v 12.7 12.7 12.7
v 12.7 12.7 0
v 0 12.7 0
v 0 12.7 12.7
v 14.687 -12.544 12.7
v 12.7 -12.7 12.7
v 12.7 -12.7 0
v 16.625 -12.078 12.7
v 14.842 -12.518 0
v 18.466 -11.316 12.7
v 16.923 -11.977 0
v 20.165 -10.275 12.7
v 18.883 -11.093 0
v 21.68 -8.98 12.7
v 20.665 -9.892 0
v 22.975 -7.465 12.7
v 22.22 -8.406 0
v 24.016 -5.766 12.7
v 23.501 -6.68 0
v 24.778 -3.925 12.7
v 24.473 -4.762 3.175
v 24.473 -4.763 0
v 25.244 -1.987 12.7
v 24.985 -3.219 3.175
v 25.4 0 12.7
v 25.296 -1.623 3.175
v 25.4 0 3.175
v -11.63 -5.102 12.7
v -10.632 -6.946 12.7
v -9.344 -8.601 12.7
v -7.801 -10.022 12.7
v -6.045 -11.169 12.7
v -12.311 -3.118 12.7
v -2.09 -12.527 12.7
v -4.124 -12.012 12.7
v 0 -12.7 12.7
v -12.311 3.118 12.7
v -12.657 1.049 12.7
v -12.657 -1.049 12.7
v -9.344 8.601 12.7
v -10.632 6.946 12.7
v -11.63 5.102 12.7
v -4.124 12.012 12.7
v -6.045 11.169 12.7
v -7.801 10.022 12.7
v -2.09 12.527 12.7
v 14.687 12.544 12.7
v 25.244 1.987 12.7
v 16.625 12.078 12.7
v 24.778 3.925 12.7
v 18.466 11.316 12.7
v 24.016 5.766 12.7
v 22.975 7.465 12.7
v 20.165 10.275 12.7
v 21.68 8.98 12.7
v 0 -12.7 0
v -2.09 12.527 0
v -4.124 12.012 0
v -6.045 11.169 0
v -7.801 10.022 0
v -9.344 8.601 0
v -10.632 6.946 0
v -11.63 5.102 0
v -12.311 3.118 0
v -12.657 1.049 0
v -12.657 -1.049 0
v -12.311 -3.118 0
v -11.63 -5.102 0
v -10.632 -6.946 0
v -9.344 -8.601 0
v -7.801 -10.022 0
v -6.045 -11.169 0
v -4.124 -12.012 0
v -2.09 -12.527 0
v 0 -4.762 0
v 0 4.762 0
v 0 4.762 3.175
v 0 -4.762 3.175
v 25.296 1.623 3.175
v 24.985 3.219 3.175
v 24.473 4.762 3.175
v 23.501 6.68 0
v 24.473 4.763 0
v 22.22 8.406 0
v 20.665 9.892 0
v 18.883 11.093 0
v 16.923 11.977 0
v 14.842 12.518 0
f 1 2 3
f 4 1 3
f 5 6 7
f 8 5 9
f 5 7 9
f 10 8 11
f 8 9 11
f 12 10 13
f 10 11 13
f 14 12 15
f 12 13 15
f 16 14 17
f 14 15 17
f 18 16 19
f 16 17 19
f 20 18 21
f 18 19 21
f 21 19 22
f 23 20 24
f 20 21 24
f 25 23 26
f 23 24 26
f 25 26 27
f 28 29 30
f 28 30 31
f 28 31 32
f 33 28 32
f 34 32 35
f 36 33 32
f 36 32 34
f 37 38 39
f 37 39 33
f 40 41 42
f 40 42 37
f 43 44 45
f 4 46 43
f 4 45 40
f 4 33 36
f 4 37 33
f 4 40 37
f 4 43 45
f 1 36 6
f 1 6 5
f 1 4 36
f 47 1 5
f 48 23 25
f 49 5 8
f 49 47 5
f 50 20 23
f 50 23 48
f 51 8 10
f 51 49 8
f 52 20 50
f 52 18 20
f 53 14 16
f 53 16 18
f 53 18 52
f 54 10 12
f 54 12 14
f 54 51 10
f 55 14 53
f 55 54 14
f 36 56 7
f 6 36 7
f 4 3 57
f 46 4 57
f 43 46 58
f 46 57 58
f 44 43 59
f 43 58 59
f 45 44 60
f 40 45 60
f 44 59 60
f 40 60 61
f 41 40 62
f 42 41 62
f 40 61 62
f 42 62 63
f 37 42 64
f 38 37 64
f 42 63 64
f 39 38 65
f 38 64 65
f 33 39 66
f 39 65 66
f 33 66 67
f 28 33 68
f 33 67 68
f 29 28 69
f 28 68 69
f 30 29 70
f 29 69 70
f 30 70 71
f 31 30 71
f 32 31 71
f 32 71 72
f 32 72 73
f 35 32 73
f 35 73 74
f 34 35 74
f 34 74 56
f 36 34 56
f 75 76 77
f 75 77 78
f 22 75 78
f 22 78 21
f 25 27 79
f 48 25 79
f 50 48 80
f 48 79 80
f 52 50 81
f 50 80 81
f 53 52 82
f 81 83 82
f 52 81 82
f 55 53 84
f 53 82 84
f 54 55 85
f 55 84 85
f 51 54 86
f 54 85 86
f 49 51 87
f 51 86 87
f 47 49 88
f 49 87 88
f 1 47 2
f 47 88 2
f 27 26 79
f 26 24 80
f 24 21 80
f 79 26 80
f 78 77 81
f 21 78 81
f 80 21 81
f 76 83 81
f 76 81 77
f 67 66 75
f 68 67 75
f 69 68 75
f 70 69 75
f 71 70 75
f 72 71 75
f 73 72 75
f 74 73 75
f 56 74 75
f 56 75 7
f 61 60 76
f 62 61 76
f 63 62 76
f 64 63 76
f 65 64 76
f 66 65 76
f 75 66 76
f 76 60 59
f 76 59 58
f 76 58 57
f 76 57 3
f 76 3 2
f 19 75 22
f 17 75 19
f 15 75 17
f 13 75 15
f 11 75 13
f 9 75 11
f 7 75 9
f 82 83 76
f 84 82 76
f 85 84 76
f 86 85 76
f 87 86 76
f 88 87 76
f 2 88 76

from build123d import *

# Parameters (mm, degrees)
F1_DEPTH = 12.7
F3_DEPTH = 3.175


with BuildPart() as f1:
    # F0 (on Top) → F1 (new body)
    with BuildSketch(Plane.XY):
        with BuildLine():
            Line((0, 0), (0, 12.7))
            ThreePointArc((0, 12.7), (-12.7, 0), (0, -12.7))
            Line((0, -12.7), (0, 0))
        make_face()
        with BuildLine():
            Line((12.7, 0), (0, 0))
            ThreePointArc((0, 0), (1.701477, -6.35), (6.35, -10.998523))
            ThreePointArc((6.35, -10.998523), (10.998523, -6.35), (12.7, 0))
        make_face()
        with BuildLine():
            Line((0, 0), (0, -12.7))
            ThreePointArc((0, -12.7), (3.287002, -12.267258), (6.35, -10.998523))
            ThreePointArc((6.35, -10.998523), (1.701477, -6.35), (0, 0))
        make_face()
        with BuildLine():
            ThreePointArc((6.35, 10.998523), (3.287002, 12.267258), (0, 12.7))
            Line((0, 12.7), (0, 0))
            ThreePointArc((0, 0), (1.701477, 6.35), (6.35, 10.998523))
        make_face()
        with BuildLine():
            ThreePointArc((12.7, 0), (10.998523, 6.35), (6.35, 10.998523))
            ThreePointArc((6.35, 10.998523), (1.701477, 6.35), (0, 0))
            Line((0, 0), (12.7, 0))
        make_face()
        with BuildLine():
            ThreePointArc((12.7, 12.7), (9.412998, 12.267258), (6.35, 10.998523))
            ThreePointArc((6.35, 10.998523), (10.998523, 6.35), (12.7, 0))
            Line((12.7, 0), (12.7, 12.7))
        make_face()
        with BuildLine():
            ThreePointArc((25.4, 0), (21.680256, 8.980256), (12.7, 12.7))
            Line((12.7, 12.7), (12.7, 0))
            Line((12.7, 0), (12.7, -12.7))
            ThreePointArc((12.7, -12.7), (21.680256, -8.980256), (25.4, 0))
        make_face()
        with BuildLine():
            ThreePointArc((6.35, -10.998523), (3.287002, -12.267258), (0, -12.7))
            Line((0, -12.7), (12.7, -12.7))
            ThreePointArc((12.7, -12.7), (9.412998, -12.267258), (6.35, -10.998523))
        make_face()
        with BuildLine():
            Line((12.7, 12.7), (0, 12.7))
            ThreePointArc((0, 12.7), (3.287002, 12.267258), (6.35, 10.998523))
            ThreePointArc((6.35, 10.998523), (9.412998, 12.267258), (12.7, 12.7))
        make_face()
        with BuildLine():
            ThreePointArc((12.7, 0), (10.998523, -6.35), (6.35, -10.998523))
            ThreePointArc((6.35, -10.998523), (9.412998, -12.267258), (12.7, -12.7))
            Line((12.7, -12.7), (12.7, 0))
        make_face()
    extrude(amount=F1_DEPTH)

    # F2 (on Top) → F3 (cut)
    with BuildSketch(Plane.XY):
        Polygon((0, 4.7625), (0, 0), (0, -4.7625), (25.4, -4.7625), (25.4, 4.7625), align=None)
    extrude(amount=F3_DEPTH, mode=Mode.SUBTRACT)


solid = f1.part
